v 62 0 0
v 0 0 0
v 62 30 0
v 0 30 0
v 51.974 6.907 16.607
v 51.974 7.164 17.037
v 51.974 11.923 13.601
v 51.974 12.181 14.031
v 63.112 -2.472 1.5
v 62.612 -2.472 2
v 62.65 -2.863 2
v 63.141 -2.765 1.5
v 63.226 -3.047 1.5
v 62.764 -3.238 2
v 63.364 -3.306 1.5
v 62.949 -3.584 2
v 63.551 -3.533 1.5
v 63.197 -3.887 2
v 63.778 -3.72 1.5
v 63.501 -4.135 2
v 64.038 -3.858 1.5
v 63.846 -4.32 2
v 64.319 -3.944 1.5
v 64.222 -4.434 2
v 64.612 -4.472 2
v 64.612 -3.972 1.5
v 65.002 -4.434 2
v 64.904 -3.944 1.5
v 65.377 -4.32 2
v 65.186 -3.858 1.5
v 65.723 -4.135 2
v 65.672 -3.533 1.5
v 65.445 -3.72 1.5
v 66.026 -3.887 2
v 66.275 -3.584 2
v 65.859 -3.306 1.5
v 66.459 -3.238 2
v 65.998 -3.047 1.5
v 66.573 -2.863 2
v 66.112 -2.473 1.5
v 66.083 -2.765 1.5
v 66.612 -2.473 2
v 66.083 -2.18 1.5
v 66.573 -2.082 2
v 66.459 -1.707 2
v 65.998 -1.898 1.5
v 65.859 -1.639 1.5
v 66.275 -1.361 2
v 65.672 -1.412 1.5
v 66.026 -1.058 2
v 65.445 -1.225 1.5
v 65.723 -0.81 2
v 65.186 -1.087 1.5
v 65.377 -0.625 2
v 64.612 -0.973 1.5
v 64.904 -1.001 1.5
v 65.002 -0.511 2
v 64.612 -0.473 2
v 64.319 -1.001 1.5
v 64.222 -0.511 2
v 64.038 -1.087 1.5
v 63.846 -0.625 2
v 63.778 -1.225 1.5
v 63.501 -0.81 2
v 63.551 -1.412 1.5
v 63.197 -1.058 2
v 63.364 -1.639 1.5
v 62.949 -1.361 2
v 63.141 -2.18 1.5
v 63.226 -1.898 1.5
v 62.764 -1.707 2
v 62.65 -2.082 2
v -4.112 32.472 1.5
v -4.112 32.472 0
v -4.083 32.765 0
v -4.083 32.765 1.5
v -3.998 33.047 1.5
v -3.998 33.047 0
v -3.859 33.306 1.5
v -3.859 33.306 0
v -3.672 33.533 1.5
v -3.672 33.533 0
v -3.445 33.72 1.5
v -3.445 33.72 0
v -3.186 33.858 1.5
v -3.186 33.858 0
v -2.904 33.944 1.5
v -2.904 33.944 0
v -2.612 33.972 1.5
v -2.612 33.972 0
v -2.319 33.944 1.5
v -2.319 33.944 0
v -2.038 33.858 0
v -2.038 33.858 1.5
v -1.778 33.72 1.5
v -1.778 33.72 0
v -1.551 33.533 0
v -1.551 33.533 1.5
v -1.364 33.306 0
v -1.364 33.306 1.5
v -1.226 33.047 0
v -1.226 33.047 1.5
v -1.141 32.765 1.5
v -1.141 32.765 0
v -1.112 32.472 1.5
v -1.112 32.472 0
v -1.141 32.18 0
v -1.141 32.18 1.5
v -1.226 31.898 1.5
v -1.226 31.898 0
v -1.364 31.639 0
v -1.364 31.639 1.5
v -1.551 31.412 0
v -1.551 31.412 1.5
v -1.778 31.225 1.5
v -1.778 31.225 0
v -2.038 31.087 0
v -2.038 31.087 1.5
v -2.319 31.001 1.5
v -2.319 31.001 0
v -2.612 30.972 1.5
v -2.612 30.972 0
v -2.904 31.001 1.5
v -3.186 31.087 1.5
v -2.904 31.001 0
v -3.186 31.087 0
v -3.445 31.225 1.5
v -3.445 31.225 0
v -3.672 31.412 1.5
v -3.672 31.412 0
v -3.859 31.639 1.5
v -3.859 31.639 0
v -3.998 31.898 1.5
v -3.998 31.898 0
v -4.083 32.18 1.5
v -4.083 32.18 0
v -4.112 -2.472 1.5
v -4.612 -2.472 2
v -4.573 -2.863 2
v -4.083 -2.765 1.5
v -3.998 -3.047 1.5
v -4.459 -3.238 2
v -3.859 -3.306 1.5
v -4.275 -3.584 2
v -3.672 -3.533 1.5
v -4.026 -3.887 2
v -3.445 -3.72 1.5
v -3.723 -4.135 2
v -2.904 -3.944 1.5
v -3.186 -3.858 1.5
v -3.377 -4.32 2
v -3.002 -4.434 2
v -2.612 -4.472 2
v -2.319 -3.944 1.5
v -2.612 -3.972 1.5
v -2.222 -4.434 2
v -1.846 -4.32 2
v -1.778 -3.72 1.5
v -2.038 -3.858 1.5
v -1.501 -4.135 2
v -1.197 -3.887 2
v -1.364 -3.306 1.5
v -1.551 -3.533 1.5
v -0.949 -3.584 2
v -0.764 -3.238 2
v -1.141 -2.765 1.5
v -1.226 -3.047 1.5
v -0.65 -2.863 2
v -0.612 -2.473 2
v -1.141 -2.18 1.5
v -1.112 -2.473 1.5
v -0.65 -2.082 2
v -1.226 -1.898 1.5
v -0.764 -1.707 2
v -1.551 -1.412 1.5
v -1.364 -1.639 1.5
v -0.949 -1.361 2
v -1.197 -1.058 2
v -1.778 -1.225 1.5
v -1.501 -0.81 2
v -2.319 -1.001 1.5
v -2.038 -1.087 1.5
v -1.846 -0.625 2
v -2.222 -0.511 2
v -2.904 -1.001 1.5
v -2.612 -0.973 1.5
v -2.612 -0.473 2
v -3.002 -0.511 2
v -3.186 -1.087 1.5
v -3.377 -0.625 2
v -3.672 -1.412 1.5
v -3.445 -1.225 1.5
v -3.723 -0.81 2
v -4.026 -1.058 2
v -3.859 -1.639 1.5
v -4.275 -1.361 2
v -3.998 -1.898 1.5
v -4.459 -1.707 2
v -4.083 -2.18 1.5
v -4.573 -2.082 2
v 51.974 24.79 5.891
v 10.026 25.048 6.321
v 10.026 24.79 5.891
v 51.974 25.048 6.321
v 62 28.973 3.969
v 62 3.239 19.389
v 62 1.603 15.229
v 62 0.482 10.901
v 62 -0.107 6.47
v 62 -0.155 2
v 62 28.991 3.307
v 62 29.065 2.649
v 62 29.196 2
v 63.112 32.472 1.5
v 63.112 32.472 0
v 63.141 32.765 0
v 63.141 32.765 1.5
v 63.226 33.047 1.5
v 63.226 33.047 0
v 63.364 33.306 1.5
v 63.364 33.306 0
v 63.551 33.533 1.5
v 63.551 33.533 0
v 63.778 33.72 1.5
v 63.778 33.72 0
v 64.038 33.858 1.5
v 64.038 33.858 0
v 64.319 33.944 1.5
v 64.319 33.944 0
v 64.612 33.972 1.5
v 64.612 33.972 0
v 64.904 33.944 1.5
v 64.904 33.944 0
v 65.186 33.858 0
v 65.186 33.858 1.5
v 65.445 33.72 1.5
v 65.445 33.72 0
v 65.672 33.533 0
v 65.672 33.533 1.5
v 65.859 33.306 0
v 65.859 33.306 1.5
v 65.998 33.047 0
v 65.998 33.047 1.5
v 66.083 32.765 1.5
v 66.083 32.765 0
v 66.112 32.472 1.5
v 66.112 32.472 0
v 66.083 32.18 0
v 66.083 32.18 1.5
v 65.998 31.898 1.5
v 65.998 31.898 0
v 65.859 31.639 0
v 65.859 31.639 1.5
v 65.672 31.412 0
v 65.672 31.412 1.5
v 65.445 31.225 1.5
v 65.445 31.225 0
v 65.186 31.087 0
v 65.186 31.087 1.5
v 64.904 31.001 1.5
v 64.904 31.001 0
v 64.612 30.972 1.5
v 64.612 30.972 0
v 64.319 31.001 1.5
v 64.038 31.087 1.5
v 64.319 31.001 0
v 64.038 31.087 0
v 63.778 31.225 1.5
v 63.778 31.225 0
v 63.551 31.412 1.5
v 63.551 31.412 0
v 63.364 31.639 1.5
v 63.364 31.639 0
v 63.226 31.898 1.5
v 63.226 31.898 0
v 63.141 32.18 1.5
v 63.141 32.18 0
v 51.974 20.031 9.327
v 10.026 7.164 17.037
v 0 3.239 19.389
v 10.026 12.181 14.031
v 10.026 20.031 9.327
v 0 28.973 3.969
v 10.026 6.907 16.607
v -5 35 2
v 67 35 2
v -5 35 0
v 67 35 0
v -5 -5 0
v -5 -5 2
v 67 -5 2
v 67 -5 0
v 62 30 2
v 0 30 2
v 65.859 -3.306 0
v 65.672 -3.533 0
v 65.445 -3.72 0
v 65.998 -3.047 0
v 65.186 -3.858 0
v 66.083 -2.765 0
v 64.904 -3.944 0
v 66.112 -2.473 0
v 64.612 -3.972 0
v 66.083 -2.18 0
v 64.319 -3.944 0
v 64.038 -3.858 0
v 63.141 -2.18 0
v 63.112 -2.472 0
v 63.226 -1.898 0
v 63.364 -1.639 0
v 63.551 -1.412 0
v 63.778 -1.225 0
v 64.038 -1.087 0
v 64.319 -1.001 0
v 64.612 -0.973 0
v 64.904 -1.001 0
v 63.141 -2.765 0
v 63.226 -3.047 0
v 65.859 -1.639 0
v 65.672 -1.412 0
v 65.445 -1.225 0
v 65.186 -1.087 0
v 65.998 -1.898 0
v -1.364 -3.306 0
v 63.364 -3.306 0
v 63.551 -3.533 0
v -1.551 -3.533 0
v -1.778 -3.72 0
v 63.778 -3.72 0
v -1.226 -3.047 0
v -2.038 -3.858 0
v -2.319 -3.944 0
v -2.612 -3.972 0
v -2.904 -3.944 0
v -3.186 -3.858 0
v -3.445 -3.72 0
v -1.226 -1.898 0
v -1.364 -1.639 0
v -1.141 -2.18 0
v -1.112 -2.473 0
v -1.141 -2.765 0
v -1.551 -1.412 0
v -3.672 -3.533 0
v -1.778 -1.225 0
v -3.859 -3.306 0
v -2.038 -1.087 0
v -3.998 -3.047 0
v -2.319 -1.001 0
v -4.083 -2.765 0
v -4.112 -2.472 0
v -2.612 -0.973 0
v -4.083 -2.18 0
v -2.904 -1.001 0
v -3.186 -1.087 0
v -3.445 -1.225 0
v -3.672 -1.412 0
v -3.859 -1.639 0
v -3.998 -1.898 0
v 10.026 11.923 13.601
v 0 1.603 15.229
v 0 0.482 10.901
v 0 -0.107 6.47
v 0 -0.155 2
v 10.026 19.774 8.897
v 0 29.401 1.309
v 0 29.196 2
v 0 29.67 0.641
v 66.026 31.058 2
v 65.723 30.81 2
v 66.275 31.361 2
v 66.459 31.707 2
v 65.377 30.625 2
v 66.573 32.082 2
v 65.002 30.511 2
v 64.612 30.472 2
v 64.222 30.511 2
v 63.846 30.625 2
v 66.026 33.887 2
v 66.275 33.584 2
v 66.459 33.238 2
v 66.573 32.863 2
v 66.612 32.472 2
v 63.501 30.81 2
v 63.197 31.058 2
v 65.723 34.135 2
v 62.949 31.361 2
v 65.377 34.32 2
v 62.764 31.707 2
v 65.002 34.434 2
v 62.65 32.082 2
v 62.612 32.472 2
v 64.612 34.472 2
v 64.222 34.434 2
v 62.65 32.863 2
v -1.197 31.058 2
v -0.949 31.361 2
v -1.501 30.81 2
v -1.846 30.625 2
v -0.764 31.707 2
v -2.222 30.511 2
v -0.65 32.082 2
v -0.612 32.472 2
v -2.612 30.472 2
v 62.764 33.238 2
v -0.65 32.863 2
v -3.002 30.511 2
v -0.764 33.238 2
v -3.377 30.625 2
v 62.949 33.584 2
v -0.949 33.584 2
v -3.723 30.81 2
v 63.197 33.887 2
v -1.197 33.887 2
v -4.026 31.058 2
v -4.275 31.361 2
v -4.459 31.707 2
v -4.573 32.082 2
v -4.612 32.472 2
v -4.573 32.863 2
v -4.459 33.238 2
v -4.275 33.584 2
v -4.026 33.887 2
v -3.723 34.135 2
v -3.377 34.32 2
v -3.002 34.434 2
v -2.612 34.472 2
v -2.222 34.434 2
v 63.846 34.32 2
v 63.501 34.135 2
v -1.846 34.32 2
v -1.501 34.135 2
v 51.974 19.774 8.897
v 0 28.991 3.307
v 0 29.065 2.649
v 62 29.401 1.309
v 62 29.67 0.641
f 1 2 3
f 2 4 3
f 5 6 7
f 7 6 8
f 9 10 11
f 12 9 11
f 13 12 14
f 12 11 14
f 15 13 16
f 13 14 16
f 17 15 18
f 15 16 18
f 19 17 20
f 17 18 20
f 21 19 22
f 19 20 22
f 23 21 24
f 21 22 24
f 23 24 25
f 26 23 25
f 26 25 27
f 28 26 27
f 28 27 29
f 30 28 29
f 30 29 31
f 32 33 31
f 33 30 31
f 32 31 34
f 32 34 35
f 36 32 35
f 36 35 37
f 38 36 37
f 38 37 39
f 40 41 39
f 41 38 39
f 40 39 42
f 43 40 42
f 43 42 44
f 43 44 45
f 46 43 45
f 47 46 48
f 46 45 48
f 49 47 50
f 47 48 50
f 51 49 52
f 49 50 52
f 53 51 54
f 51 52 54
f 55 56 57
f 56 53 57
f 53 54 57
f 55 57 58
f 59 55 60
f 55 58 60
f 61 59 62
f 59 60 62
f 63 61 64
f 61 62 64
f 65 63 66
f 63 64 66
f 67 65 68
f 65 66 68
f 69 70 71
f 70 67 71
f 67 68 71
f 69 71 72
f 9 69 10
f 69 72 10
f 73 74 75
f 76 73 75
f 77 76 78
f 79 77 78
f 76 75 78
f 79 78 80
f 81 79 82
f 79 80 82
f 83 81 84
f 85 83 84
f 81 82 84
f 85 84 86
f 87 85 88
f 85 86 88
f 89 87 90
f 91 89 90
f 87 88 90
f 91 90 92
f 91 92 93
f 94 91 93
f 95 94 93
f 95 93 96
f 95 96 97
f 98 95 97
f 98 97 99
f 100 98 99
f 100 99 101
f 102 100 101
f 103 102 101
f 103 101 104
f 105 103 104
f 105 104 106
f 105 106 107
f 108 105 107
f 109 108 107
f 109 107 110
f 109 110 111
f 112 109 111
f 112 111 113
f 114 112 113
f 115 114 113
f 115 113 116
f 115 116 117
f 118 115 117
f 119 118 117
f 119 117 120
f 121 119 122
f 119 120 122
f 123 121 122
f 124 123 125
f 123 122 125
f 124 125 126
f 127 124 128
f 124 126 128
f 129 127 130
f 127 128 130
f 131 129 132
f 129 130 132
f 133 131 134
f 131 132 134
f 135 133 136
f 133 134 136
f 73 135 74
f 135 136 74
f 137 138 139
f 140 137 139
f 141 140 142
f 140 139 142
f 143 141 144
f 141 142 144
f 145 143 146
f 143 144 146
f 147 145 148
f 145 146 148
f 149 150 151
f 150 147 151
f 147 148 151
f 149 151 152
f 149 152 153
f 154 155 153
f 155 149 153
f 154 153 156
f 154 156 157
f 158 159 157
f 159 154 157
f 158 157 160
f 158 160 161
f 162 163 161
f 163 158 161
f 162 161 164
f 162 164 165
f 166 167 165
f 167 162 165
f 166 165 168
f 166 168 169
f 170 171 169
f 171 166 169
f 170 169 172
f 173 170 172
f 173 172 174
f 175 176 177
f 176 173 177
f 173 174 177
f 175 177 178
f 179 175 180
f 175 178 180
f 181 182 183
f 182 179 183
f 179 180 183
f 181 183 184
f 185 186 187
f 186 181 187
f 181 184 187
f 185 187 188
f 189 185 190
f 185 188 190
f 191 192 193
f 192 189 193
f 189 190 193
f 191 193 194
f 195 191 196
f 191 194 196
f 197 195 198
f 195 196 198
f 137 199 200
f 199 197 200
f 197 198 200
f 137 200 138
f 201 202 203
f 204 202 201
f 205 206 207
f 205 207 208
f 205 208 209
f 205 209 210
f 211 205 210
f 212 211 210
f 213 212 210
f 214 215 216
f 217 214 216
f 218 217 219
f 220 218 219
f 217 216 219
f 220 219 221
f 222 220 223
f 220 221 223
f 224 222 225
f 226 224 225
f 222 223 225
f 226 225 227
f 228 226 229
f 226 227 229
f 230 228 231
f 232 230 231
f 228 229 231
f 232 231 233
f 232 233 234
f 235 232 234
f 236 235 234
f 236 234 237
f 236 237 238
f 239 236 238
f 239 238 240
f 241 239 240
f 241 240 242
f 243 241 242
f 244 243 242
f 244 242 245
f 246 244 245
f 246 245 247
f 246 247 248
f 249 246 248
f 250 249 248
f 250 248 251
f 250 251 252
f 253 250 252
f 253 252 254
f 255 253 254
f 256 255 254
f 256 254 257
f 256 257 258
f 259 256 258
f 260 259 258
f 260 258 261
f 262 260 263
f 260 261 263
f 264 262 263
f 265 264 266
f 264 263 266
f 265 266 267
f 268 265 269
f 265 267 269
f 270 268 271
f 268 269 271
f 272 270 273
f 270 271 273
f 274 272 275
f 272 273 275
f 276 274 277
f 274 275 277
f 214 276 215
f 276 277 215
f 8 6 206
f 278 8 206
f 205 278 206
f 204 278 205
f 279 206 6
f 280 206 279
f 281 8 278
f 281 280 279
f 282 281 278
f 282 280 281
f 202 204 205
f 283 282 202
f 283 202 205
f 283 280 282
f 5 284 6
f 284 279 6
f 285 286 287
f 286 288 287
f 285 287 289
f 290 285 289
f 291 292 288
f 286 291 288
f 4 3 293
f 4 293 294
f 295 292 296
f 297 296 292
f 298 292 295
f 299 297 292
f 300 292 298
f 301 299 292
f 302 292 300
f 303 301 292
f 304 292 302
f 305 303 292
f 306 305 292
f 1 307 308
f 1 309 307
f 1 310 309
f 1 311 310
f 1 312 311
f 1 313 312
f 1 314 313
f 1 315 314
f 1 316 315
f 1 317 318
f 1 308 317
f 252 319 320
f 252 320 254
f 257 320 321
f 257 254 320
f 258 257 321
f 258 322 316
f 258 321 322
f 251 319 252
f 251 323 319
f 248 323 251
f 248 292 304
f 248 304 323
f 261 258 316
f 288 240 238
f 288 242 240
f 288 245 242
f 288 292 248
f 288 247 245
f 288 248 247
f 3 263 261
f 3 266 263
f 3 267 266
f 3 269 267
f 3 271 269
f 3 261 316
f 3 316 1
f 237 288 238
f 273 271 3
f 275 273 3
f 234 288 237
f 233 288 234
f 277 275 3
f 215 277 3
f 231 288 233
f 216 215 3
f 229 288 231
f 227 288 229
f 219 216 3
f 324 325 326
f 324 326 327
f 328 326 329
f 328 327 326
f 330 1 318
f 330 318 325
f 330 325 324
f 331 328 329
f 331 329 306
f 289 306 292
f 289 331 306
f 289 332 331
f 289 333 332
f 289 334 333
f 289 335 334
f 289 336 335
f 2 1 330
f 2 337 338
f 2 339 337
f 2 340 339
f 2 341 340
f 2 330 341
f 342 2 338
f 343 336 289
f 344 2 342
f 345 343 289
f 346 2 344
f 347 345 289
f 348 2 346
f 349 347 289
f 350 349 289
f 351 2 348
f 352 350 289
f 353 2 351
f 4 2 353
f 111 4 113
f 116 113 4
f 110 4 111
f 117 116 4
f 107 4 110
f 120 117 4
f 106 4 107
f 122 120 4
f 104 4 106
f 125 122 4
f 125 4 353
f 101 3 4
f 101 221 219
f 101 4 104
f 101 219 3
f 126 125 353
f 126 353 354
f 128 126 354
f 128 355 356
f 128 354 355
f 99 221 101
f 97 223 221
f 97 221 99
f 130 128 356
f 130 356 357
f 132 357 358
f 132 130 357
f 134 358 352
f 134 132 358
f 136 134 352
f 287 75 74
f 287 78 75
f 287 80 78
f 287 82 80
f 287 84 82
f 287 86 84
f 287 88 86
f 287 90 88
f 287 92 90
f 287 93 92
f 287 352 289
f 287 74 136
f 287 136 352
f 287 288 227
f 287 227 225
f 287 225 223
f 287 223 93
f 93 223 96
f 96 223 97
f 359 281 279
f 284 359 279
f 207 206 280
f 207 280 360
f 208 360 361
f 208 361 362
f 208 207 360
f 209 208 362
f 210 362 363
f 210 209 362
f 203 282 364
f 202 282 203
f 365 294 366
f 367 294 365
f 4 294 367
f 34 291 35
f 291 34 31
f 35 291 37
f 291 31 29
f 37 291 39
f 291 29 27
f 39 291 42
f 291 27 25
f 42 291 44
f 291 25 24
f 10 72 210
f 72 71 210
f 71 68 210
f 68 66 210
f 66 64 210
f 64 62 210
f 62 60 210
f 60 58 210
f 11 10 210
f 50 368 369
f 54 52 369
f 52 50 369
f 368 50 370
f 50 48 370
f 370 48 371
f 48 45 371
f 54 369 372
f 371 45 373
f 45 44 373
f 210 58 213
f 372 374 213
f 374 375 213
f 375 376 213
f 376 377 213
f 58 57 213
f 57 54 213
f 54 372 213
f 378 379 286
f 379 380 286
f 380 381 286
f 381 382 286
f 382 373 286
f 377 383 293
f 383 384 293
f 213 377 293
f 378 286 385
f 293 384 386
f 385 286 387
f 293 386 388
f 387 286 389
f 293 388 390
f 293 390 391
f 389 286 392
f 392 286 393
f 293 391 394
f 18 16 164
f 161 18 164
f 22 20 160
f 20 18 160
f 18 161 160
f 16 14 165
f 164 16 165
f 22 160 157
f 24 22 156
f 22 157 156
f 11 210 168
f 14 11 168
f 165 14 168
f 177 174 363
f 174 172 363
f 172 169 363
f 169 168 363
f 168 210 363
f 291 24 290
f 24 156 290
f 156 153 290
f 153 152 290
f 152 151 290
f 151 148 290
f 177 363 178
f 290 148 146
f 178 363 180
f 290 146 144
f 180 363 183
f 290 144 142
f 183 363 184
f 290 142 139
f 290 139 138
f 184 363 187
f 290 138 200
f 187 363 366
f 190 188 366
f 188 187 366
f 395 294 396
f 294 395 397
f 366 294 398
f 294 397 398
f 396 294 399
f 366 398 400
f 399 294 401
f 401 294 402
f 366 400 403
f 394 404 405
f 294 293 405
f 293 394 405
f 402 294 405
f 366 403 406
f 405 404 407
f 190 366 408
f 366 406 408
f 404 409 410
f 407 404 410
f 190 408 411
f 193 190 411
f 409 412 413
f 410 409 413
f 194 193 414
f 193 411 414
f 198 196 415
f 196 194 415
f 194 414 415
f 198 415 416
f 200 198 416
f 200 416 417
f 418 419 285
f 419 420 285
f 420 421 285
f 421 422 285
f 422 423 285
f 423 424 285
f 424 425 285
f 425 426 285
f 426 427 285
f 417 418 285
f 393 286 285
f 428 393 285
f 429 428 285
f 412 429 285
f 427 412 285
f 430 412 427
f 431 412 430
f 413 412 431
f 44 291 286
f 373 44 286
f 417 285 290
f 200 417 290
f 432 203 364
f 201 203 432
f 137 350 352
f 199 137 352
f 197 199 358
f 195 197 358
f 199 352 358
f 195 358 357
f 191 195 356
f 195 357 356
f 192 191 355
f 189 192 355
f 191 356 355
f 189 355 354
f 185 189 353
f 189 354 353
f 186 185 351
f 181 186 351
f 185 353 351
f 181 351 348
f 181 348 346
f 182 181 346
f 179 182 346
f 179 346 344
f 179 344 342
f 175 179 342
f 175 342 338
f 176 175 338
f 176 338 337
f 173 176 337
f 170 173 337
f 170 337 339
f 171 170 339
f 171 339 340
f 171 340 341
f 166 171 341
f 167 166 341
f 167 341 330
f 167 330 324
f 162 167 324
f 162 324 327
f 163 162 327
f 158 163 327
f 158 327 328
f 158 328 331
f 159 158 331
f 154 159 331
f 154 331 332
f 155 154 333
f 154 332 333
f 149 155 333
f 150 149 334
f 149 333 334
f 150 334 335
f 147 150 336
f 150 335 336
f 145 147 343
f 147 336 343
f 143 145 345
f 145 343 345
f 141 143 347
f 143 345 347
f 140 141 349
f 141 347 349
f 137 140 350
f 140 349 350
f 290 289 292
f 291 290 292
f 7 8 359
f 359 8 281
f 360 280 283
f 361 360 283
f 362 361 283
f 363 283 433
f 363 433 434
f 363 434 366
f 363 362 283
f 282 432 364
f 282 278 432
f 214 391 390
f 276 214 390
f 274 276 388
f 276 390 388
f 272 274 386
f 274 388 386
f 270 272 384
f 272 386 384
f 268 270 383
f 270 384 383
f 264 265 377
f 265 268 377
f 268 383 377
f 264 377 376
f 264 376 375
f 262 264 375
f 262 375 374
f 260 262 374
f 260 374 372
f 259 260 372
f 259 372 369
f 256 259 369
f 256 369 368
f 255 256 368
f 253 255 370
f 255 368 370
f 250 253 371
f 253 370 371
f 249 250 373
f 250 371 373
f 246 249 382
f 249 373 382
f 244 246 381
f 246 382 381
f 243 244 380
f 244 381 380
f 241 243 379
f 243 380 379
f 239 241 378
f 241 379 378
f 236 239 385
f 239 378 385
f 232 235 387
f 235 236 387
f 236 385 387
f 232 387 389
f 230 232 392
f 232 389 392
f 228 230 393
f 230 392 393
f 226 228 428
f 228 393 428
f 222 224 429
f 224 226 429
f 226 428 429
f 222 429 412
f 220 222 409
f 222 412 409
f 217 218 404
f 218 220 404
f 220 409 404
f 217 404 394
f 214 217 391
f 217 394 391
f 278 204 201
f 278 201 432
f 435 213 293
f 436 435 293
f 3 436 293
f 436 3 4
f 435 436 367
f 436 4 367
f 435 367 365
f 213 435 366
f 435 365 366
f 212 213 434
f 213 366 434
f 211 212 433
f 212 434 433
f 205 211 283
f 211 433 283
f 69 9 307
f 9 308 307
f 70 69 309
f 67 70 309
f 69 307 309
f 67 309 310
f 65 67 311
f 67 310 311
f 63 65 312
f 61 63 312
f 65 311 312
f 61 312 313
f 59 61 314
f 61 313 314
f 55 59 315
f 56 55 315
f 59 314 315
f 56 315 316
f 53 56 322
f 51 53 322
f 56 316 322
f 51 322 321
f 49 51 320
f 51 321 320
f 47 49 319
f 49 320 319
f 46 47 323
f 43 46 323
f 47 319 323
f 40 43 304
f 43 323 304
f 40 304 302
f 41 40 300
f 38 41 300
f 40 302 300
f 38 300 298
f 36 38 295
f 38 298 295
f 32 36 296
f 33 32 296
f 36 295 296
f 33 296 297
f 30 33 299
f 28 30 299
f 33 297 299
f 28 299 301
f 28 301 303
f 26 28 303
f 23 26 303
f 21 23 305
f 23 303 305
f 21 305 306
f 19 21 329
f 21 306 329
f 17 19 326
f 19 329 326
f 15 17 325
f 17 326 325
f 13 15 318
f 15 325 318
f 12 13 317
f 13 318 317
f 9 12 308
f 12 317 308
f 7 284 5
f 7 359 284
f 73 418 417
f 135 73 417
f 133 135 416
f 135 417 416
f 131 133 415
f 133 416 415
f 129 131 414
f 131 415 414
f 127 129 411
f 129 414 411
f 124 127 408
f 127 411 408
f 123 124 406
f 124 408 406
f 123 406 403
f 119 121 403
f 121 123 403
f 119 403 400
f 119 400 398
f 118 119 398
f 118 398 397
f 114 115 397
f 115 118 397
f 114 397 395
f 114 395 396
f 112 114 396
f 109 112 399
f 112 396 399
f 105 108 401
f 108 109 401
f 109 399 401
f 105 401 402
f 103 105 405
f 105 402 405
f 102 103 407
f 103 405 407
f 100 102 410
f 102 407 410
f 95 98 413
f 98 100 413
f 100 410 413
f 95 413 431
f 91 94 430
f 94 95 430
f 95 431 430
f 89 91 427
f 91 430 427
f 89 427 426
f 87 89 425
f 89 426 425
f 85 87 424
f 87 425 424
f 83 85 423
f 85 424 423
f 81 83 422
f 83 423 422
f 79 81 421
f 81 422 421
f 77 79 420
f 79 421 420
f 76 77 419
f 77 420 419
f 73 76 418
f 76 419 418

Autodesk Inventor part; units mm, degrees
ref_plane "YZ Plane" through (0, 0, 0) normal (1, 0, 0) x (0, 1, 0)
ref_plane "XZ Plane" through (0, 0, 0) normal (0, 1, 0) x (-1, 0, 0)
ref_plane "XY Plane" through (0, 0, 0) normal (0, 0, 1) x (1, 0, 0)
sketch "Sketch1" plane through (0, 0, 0) normal (0, 0, 1) x (1, 0, 0)
  line L0 (0, 0) -> (62, 0)
  line L1 (62, 0) -> (62, 30)
  line L2 (62, 30) -> (0, 30)
  line L3 (0, 30) -> (0, 0)
  dimension "d0" = 62
  dimension "d1" = 30
sketch "Sketch2" plane through (0, 0, 0) normal (1, 0, 0) x (0, 1, 0)
  line L0 (0, 0) -> (30, 0) projected
  arc A0 (16.1062, 11.6791) -> (15, 0) centre (36.6604, 3.8403) ccw
sweep "Sweep1" add profiles "Sketch1" path "Sketch2" path curves A0
sketch "Sketch3" plane through (62, 0, 0) normal (0, 0, -1) x (-1, 0, 0)
  line L0 (0, 0) -> (0, 30) projected
  line L1 (62, 0) -> (0, 0) projected
  line L2 (62, 30) -> (62, 0) projected
  line L3 (0, 30) -> (62, 30) projected
  line L4 (0, 30) -> (62, 0) construction
  line L5 (0, 0) -> (62, 30) construction
  line L6 (67, 35) -> (67, -5)
  line L7 (67, -5) -> (-5, -5)
  line L8 (-5, -5) -> (-5, 35)
  line L9 (-5, 35) -> (67, 35)
  dimension "d4" = 5
extrude "Extrusion1" add sketch "Sketch3" against normal blind 2
sketch "Sketch4" plane through (67, -5, 0) normal (0, 0, -1) x (-1, 0, 0)
  point P0 (67, 5)
sketch "Sketch6" plane through (0, 28.9732, 3.9694) normal (0, 0.514, 0.8578) x (1, 0, 0)
  line L0 (0, 1.893) -> (62, 1.893) construction
  line L1 (62, -30) -> (62, 0) construction
  line L2 (62, -15) -> (0, -15) construction
  line L3 (0, -23.9737) -> (0, -30) construction
  line L4 (31, -15) -> (31, -30) construction
  line L5 (31, -15) -> (31, 0) construction
  line L6 (62, 0) -> (0, 0) construction
  line L7 (62, -22.5) -> (31, -22.5) construction
  line L8 (31, -22.5) -> (0, -22.5) construction
  line L9 (31, -7.5) -> (0, -7.5) construction
  line L10 (0, 0) -> (0, -30) construction
  line L11 (31, -7.5) -> (62, -7.5) construction
  line L12 (51.9742, -19.576) -> (10.0258, -19.576)
  line L13 (10.0258, -19.576) -> (10.0258, -25.424)
  line L14 (10.0258, -25.424) -> (51.9742, -25.424)
  line L15 (51.9742, -25.424) -> (51.9742, -19.576)
  line L16 (51.9742, -19.576) -> (10.0258, -25.424) construction
  line L17 (10.0258, -19.576) -> (51.9742, -25.424) construction
  line L18 (51.9742, -10.424) -> (10.0258, -10.424)
  line L19 (10.0258, -10.424) -> (10.0258, -4.576)
  line L20 (10.0258, -4.576) -> (51.9742, -4.576)
  line L21 (51.9742, -4.576) -> (51.9742, -10.424)
  point P0 (0, -22.8131)
  dimension "d8" = 15
  dimension "d9" = 15
  dimension "d10" = 82.064
  dimension "d11" = 41.9483
extrude "Extrusion2" cut sketch "Sketch6" against normal blind 0.5
sketch "Sketch7" plane through (67, -5, 0) normal (0, 0, -1) x (-1, 0, 0)
  circle A0 centre (2.3883, 37.4725) radius 1.5
  line L0 (72, 40) -> (0, 40) construction
  line L1 (36, 40) -> (36, 0) construction
  line L2 (72, 0) -> (0, 0) construction
  line L3 (0, 40) -> (0, 0) construction
  line L4 (0, 20) -> (72, 20) construction
  line L5 (72, 40) -> (72, 0) construction
  circle A1 centre (2.3883, 2.5275) radius 1.5
  circle A2 centre (69.6117, 37.4725) radius 1.5
  circle A3 centre (69.6117, 2.5275) radius 1.5
  point P0 (67, 5)
  dimension "d14" = 3
extrude "Extrusion3" cut sketch "Sketch7" against normal blind 25.4
chamfer "Chamfer1" distance 0.5 angle 45 4 edges at (-1.1117, -2.4725, 2) (66.1117, -2.4725, 2) (66.1117, 32.4725, 2) (-1.1117, 32.4725, 2)
properties part number "DsholdtilterV1"
